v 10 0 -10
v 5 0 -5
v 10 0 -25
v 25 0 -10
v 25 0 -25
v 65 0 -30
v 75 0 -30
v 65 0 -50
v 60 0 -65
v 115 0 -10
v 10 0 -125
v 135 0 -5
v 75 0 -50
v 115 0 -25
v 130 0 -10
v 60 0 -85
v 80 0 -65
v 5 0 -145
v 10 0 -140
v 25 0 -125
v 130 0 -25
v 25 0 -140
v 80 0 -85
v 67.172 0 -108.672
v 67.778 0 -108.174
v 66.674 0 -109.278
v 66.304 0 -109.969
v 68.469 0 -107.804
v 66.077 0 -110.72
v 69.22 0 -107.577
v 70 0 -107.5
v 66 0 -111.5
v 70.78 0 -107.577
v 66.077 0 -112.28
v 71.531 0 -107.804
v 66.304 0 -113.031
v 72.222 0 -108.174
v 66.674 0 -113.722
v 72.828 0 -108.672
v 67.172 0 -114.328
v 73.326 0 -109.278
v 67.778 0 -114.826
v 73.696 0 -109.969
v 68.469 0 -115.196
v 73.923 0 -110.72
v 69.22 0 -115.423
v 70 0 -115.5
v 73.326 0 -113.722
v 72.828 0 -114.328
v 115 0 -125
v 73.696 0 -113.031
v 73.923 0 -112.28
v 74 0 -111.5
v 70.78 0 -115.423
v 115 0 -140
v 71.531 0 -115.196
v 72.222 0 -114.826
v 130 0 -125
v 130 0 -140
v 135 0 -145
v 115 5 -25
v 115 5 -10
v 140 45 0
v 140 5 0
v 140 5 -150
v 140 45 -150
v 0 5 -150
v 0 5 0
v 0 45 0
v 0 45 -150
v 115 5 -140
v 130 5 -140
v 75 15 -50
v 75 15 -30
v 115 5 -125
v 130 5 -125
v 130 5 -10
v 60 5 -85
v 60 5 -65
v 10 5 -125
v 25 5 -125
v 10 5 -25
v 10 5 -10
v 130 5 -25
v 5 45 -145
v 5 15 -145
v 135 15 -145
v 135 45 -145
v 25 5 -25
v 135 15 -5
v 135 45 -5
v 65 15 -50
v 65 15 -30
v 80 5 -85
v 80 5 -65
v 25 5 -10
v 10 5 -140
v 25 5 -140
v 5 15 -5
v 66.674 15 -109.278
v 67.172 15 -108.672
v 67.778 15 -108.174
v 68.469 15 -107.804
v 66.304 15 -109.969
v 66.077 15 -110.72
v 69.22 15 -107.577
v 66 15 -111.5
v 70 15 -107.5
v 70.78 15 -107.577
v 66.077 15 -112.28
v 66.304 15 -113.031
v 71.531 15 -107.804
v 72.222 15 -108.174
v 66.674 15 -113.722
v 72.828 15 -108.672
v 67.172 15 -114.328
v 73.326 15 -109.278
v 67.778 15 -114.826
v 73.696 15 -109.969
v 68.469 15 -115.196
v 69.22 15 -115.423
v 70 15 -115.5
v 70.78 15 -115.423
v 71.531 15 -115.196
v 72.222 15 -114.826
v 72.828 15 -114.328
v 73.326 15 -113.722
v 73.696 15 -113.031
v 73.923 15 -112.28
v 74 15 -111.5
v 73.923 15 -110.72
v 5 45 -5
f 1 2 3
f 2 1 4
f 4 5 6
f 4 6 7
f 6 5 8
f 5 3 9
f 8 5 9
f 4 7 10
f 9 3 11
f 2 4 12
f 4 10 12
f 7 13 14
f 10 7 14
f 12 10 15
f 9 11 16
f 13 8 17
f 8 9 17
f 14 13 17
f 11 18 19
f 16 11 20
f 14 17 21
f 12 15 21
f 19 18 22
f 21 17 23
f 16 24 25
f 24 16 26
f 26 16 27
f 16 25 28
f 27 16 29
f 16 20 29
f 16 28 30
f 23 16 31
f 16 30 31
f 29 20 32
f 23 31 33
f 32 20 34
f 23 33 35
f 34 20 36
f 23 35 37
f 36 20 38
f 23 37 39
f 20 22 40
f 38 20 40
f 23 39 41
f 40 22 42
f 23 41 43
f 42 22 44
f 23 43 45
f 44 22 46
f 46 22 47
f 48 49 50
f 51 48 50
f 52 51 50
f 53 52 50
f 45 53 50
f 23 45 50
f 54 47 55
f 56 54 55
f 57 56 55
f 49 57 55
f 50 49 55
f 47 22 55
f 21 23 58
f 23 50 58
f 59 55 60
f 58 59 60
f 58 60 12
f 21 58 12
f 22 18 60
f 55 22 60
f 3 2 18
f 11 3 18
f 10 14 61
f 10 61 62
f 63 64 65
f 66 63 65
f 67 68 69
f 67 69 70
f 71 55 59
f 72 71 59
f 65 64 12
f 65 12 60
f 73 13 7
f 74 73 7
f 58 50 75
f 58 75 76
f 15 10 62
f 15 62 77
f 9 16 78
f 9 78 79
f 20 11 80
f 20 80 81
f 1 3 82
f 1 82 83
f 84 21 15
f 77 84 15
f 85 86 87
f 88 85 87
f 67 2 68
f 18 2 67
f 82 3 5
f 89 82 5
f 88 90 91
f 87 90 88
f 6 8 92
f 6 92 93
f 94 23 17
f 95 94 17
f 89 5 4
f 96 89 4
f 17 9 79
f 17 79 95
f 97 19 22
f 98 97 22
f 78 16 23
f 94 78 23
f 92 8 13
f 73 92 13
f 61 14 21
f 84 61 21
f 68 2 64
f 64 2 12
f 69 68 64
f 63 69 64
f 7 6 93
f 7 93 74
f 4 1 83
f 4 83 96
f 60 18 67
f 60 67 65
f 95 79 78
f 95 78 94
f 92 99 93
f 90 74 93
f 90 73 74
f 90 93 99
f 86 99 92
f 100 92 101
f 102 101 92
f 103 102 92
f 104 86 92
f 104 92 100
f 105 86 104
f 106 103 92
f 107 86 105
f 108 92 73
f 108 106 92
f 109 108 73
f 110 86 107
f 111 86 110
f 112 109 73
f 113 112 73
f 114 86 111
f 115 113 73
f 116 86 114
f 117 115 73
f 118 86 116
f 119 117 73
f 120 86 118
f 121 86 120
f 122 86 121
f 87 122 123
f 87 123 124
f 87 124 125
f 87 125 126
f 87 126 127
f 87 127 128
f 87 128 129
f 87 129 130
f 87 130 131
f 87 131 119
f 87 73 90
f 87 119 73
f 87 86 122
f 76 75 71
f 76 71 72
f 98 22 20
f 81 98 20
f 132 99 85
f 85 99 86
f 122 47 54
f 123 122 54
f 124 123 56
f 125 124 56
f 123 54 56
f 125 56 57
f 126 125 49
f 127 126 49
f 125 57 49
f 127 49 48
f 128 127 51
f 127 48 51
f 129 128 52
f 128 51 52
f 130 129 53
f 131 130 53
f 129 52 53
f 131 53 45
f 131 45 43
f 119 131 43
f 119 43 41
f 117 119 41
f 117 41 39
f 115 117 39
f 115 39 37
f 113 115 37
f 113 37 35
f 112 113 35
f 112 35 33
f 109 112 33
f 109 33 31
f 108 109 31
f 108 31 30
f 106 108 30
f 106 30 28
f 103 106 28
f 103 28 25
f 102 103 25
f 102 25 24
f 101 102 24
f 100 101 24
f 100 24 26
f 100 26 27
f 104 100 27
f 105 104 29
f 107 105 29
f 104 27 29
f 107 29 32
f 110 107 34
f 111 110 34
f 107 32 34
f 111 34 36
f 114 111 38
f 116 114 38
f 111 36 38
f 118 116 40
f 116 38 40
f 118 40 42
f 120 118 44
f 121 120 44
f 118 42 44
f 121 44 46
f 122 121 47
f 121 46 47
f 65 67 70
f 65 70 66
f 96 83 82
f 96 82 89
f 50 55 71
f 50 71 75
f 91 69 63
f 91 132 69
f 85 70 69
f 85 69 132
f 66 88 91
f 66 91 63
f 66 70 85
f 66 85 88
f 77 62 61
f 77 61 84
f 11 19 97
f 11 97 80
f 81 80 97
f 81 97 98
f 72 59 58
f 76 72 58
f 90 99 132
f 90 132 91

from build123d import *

# Parameters (mm, degrees)
SKETCH3_W           = 140
SKETCH3_H           = 150
BOSS_EXTRUDE1_DEPTH = 15
SKETCH19_W          = 15
SKETCH19_H          = 15
CUT_EXTRUDE1_DEPTH  = 5
SKETCH20_W          = 15
SKETCH20_H          = 15
CUT_EXTRUDE2_DEPTH  = 5
SKETCH21_W          = 15
SKETCH21_H          = 15
CUT_EXTRUDE3_DEPTH  = 5
SKETCH22_W          = 15
SKETCH22_H          = 15
CUT_EXTRUDE4_DEPTH  = 5
SKETCH24_W          = 20
SKETCH24_H          = 20
CUT_EXTRUDE6_DEPTH  = 5
SKETCH25_R          = 4
CUT_EXTRUDE7_DEPTH  = 206.730406114
SKETCH26_W          = 10
SKETCH26_H          = 20
CUT_EXTRUDE8_DEPTH  = 206.730406114
SKETCH27_W          = 5
SKETCH27_H          = 150
BOSS_EXTRUDE2_DEPTH = 30
SKETCH28_W          = 135
SKETCH28_H          = 5
BOSS_EXTRUDE3_DEPTH = 30
SKETCH29_W          = 5
SKETCH29_H          = 145
BOSS_EXTRUDE4_DEPTH = 30
SKETCH30_W          = 130
SKETCH30_H          = 5
BOSS_EXTRUDE5_DEPTH = 30
CHAMFER2_SIZE       = 5


with BuildPart() as part:
    # Sketch3 → Boss-Extrude1 (new body)
    with BuildSketch(Plane(origin=(0, 0, 0), x_dir=(1, 0, 0), z_dir=(0, 1, 0))):
        with Locations((70, 75)):
            Rectangle(SKETCH3_W, SKETCH3_H)
    extrude(amount=BOSS_EXTRUDE1_DEPTH)

    # Sketch19 → Cut-Extrude1 (cut)
    with BuildSketch(Plane.XZ):
        with Locations((17.5, -17.5)):
            Rectangle(SKETCH19_W, SKETCH19_H)
    extrude(amount=-CUT_EXTRUDE1_DEPTH, mode=Mode.SUBTRACT)

    # Sketch20 → Cut-Extrude2 (cut)
    with BuildSketch(Plane.XZ):
        with Locations((122.5, -17.5)):
            Rectangle(SKETCH20_W, SKETCH20_H)
    extrude(amount=-CUT_EXTRUDE2_DEPTH, mode=Mode.SUBTRACT)

    # Sketch21 → Cut-Extrude3 (cut)
    with BuildSketch(Plane.XZ):
        with Locations((17.5, -132.5)):
            Rectangle(SKETCH21_W, SKETCH21_H)
    extrude(amount=-CUT_EXTRUDE3_DEPTH, mode=Mode.SUBTRACT)

    # Sketch22 → Cut-Extrude4 (cut)
    with BuildSketch(Plane.XZ):
        with Locations((122.5, -132.5)):
            Rectangle(SKETCH22_W, SKETCH22_H)
    extrude(amount=-CUT_EXTRUDE4_DEPTH, mode=Mode.SUBTRACT)

    # Sketch24 → Cut-Extrude6 (cut)
    with BuildSketch(Plane.XZ):
        with Locations((70, -75)):
            Rectangle(SKETCH24_W, SKETCH24_H)
    extrude(amount=-CUT_EXTRUDE6_DEPTH, mode=Mode.SUBTRACT)

    # Sketch25 → Cut-Extrude7 (cut, through all)
    with BuildSketch(Plane(origin=(0, 0, 0), x_dir=(-1, 0, 0), z_dir=(0, -1, 0))):
        with Locations(Location((-70, 111.5, 0), (0, 0, 90))):
            Circle(SKETCH25_R)
    extrude(amount=-CUT_EXTRUDE7_DEPTH, mode=Mode.SUBTRACT)

    # Sketch26 → Cut-Extrude8 (cut, through all)
    with BuildSketch(Plane.XZ):
        with Locations((70, -40)):
            Rectangle(SKETCH26_W, SKETCH26_H)
    extrude(amount=-CUT_EXTRUDE8_DEPTH, mode=Mode.SUBTRACT)

    # Sketch27 → Boss-Extrude2 (add)
    with BuildSketch(Plane(origin=(0, 15, 0), x_dir=(1, 0, 0), z_dir=(0, 1, 0))):
        with Locations((2.5, 75)):
            Rectangle(SKETCH27_W, SKETCH27_H)
    extrude(amount=BOSS_EXTRUDE2_DEPTH)

    # Sketch28 → Boss-Extrude3 (add)
    with BuildSketch(Plane(origin=(0, 15, 0), x_dir=(1, 0, 0), z_dir=(0, 1, 0))):
        with Locations((72.5, 147.5)):
            Rectangle(SKETCH28_W, SKETCH28_H)
    extrude(amount=BOSS_EXTRUDE3_DEPTH)

    # Sketch29 → Boss-Extrude4 (add)
    with BuildSketch(Plane(origin=(0, 15, 0), x_dir=(1, 0, 0), z_dir=(0, 1, 0))):
        with Locations((137.5, 72.5)):
            Rectangle(SKETCH29_W, SKETCH29_H)
    extrude(amount=BOSS_EXTRUDE4_DEPTH)

    # Sketch30 → Boss-Extrude5 (add)
    with BuildSketch(Plane(origin=(0, 15, 0), x_dir=(1, 0, 0), z_dir=(0, 1, 0))):
        with Locations((70, 2.5)):
            Rectangle(SKETCH30_W, SKETCH30_H)
    extrude(amount=BOSS_EXTRUDE5_DEPTH)

    # Chamfer2
    chamfer2_edges = [part.edges().sort_by_distance(p)[0] for p in [
        (70, 0, 0),
        (140, 0, -75),
        (70, 0, -150),
        (0, 0, -75),
    ]]
    chamfer(chamfer2_edges, length=CHAMFER2_SIZE)


solid = part.part
